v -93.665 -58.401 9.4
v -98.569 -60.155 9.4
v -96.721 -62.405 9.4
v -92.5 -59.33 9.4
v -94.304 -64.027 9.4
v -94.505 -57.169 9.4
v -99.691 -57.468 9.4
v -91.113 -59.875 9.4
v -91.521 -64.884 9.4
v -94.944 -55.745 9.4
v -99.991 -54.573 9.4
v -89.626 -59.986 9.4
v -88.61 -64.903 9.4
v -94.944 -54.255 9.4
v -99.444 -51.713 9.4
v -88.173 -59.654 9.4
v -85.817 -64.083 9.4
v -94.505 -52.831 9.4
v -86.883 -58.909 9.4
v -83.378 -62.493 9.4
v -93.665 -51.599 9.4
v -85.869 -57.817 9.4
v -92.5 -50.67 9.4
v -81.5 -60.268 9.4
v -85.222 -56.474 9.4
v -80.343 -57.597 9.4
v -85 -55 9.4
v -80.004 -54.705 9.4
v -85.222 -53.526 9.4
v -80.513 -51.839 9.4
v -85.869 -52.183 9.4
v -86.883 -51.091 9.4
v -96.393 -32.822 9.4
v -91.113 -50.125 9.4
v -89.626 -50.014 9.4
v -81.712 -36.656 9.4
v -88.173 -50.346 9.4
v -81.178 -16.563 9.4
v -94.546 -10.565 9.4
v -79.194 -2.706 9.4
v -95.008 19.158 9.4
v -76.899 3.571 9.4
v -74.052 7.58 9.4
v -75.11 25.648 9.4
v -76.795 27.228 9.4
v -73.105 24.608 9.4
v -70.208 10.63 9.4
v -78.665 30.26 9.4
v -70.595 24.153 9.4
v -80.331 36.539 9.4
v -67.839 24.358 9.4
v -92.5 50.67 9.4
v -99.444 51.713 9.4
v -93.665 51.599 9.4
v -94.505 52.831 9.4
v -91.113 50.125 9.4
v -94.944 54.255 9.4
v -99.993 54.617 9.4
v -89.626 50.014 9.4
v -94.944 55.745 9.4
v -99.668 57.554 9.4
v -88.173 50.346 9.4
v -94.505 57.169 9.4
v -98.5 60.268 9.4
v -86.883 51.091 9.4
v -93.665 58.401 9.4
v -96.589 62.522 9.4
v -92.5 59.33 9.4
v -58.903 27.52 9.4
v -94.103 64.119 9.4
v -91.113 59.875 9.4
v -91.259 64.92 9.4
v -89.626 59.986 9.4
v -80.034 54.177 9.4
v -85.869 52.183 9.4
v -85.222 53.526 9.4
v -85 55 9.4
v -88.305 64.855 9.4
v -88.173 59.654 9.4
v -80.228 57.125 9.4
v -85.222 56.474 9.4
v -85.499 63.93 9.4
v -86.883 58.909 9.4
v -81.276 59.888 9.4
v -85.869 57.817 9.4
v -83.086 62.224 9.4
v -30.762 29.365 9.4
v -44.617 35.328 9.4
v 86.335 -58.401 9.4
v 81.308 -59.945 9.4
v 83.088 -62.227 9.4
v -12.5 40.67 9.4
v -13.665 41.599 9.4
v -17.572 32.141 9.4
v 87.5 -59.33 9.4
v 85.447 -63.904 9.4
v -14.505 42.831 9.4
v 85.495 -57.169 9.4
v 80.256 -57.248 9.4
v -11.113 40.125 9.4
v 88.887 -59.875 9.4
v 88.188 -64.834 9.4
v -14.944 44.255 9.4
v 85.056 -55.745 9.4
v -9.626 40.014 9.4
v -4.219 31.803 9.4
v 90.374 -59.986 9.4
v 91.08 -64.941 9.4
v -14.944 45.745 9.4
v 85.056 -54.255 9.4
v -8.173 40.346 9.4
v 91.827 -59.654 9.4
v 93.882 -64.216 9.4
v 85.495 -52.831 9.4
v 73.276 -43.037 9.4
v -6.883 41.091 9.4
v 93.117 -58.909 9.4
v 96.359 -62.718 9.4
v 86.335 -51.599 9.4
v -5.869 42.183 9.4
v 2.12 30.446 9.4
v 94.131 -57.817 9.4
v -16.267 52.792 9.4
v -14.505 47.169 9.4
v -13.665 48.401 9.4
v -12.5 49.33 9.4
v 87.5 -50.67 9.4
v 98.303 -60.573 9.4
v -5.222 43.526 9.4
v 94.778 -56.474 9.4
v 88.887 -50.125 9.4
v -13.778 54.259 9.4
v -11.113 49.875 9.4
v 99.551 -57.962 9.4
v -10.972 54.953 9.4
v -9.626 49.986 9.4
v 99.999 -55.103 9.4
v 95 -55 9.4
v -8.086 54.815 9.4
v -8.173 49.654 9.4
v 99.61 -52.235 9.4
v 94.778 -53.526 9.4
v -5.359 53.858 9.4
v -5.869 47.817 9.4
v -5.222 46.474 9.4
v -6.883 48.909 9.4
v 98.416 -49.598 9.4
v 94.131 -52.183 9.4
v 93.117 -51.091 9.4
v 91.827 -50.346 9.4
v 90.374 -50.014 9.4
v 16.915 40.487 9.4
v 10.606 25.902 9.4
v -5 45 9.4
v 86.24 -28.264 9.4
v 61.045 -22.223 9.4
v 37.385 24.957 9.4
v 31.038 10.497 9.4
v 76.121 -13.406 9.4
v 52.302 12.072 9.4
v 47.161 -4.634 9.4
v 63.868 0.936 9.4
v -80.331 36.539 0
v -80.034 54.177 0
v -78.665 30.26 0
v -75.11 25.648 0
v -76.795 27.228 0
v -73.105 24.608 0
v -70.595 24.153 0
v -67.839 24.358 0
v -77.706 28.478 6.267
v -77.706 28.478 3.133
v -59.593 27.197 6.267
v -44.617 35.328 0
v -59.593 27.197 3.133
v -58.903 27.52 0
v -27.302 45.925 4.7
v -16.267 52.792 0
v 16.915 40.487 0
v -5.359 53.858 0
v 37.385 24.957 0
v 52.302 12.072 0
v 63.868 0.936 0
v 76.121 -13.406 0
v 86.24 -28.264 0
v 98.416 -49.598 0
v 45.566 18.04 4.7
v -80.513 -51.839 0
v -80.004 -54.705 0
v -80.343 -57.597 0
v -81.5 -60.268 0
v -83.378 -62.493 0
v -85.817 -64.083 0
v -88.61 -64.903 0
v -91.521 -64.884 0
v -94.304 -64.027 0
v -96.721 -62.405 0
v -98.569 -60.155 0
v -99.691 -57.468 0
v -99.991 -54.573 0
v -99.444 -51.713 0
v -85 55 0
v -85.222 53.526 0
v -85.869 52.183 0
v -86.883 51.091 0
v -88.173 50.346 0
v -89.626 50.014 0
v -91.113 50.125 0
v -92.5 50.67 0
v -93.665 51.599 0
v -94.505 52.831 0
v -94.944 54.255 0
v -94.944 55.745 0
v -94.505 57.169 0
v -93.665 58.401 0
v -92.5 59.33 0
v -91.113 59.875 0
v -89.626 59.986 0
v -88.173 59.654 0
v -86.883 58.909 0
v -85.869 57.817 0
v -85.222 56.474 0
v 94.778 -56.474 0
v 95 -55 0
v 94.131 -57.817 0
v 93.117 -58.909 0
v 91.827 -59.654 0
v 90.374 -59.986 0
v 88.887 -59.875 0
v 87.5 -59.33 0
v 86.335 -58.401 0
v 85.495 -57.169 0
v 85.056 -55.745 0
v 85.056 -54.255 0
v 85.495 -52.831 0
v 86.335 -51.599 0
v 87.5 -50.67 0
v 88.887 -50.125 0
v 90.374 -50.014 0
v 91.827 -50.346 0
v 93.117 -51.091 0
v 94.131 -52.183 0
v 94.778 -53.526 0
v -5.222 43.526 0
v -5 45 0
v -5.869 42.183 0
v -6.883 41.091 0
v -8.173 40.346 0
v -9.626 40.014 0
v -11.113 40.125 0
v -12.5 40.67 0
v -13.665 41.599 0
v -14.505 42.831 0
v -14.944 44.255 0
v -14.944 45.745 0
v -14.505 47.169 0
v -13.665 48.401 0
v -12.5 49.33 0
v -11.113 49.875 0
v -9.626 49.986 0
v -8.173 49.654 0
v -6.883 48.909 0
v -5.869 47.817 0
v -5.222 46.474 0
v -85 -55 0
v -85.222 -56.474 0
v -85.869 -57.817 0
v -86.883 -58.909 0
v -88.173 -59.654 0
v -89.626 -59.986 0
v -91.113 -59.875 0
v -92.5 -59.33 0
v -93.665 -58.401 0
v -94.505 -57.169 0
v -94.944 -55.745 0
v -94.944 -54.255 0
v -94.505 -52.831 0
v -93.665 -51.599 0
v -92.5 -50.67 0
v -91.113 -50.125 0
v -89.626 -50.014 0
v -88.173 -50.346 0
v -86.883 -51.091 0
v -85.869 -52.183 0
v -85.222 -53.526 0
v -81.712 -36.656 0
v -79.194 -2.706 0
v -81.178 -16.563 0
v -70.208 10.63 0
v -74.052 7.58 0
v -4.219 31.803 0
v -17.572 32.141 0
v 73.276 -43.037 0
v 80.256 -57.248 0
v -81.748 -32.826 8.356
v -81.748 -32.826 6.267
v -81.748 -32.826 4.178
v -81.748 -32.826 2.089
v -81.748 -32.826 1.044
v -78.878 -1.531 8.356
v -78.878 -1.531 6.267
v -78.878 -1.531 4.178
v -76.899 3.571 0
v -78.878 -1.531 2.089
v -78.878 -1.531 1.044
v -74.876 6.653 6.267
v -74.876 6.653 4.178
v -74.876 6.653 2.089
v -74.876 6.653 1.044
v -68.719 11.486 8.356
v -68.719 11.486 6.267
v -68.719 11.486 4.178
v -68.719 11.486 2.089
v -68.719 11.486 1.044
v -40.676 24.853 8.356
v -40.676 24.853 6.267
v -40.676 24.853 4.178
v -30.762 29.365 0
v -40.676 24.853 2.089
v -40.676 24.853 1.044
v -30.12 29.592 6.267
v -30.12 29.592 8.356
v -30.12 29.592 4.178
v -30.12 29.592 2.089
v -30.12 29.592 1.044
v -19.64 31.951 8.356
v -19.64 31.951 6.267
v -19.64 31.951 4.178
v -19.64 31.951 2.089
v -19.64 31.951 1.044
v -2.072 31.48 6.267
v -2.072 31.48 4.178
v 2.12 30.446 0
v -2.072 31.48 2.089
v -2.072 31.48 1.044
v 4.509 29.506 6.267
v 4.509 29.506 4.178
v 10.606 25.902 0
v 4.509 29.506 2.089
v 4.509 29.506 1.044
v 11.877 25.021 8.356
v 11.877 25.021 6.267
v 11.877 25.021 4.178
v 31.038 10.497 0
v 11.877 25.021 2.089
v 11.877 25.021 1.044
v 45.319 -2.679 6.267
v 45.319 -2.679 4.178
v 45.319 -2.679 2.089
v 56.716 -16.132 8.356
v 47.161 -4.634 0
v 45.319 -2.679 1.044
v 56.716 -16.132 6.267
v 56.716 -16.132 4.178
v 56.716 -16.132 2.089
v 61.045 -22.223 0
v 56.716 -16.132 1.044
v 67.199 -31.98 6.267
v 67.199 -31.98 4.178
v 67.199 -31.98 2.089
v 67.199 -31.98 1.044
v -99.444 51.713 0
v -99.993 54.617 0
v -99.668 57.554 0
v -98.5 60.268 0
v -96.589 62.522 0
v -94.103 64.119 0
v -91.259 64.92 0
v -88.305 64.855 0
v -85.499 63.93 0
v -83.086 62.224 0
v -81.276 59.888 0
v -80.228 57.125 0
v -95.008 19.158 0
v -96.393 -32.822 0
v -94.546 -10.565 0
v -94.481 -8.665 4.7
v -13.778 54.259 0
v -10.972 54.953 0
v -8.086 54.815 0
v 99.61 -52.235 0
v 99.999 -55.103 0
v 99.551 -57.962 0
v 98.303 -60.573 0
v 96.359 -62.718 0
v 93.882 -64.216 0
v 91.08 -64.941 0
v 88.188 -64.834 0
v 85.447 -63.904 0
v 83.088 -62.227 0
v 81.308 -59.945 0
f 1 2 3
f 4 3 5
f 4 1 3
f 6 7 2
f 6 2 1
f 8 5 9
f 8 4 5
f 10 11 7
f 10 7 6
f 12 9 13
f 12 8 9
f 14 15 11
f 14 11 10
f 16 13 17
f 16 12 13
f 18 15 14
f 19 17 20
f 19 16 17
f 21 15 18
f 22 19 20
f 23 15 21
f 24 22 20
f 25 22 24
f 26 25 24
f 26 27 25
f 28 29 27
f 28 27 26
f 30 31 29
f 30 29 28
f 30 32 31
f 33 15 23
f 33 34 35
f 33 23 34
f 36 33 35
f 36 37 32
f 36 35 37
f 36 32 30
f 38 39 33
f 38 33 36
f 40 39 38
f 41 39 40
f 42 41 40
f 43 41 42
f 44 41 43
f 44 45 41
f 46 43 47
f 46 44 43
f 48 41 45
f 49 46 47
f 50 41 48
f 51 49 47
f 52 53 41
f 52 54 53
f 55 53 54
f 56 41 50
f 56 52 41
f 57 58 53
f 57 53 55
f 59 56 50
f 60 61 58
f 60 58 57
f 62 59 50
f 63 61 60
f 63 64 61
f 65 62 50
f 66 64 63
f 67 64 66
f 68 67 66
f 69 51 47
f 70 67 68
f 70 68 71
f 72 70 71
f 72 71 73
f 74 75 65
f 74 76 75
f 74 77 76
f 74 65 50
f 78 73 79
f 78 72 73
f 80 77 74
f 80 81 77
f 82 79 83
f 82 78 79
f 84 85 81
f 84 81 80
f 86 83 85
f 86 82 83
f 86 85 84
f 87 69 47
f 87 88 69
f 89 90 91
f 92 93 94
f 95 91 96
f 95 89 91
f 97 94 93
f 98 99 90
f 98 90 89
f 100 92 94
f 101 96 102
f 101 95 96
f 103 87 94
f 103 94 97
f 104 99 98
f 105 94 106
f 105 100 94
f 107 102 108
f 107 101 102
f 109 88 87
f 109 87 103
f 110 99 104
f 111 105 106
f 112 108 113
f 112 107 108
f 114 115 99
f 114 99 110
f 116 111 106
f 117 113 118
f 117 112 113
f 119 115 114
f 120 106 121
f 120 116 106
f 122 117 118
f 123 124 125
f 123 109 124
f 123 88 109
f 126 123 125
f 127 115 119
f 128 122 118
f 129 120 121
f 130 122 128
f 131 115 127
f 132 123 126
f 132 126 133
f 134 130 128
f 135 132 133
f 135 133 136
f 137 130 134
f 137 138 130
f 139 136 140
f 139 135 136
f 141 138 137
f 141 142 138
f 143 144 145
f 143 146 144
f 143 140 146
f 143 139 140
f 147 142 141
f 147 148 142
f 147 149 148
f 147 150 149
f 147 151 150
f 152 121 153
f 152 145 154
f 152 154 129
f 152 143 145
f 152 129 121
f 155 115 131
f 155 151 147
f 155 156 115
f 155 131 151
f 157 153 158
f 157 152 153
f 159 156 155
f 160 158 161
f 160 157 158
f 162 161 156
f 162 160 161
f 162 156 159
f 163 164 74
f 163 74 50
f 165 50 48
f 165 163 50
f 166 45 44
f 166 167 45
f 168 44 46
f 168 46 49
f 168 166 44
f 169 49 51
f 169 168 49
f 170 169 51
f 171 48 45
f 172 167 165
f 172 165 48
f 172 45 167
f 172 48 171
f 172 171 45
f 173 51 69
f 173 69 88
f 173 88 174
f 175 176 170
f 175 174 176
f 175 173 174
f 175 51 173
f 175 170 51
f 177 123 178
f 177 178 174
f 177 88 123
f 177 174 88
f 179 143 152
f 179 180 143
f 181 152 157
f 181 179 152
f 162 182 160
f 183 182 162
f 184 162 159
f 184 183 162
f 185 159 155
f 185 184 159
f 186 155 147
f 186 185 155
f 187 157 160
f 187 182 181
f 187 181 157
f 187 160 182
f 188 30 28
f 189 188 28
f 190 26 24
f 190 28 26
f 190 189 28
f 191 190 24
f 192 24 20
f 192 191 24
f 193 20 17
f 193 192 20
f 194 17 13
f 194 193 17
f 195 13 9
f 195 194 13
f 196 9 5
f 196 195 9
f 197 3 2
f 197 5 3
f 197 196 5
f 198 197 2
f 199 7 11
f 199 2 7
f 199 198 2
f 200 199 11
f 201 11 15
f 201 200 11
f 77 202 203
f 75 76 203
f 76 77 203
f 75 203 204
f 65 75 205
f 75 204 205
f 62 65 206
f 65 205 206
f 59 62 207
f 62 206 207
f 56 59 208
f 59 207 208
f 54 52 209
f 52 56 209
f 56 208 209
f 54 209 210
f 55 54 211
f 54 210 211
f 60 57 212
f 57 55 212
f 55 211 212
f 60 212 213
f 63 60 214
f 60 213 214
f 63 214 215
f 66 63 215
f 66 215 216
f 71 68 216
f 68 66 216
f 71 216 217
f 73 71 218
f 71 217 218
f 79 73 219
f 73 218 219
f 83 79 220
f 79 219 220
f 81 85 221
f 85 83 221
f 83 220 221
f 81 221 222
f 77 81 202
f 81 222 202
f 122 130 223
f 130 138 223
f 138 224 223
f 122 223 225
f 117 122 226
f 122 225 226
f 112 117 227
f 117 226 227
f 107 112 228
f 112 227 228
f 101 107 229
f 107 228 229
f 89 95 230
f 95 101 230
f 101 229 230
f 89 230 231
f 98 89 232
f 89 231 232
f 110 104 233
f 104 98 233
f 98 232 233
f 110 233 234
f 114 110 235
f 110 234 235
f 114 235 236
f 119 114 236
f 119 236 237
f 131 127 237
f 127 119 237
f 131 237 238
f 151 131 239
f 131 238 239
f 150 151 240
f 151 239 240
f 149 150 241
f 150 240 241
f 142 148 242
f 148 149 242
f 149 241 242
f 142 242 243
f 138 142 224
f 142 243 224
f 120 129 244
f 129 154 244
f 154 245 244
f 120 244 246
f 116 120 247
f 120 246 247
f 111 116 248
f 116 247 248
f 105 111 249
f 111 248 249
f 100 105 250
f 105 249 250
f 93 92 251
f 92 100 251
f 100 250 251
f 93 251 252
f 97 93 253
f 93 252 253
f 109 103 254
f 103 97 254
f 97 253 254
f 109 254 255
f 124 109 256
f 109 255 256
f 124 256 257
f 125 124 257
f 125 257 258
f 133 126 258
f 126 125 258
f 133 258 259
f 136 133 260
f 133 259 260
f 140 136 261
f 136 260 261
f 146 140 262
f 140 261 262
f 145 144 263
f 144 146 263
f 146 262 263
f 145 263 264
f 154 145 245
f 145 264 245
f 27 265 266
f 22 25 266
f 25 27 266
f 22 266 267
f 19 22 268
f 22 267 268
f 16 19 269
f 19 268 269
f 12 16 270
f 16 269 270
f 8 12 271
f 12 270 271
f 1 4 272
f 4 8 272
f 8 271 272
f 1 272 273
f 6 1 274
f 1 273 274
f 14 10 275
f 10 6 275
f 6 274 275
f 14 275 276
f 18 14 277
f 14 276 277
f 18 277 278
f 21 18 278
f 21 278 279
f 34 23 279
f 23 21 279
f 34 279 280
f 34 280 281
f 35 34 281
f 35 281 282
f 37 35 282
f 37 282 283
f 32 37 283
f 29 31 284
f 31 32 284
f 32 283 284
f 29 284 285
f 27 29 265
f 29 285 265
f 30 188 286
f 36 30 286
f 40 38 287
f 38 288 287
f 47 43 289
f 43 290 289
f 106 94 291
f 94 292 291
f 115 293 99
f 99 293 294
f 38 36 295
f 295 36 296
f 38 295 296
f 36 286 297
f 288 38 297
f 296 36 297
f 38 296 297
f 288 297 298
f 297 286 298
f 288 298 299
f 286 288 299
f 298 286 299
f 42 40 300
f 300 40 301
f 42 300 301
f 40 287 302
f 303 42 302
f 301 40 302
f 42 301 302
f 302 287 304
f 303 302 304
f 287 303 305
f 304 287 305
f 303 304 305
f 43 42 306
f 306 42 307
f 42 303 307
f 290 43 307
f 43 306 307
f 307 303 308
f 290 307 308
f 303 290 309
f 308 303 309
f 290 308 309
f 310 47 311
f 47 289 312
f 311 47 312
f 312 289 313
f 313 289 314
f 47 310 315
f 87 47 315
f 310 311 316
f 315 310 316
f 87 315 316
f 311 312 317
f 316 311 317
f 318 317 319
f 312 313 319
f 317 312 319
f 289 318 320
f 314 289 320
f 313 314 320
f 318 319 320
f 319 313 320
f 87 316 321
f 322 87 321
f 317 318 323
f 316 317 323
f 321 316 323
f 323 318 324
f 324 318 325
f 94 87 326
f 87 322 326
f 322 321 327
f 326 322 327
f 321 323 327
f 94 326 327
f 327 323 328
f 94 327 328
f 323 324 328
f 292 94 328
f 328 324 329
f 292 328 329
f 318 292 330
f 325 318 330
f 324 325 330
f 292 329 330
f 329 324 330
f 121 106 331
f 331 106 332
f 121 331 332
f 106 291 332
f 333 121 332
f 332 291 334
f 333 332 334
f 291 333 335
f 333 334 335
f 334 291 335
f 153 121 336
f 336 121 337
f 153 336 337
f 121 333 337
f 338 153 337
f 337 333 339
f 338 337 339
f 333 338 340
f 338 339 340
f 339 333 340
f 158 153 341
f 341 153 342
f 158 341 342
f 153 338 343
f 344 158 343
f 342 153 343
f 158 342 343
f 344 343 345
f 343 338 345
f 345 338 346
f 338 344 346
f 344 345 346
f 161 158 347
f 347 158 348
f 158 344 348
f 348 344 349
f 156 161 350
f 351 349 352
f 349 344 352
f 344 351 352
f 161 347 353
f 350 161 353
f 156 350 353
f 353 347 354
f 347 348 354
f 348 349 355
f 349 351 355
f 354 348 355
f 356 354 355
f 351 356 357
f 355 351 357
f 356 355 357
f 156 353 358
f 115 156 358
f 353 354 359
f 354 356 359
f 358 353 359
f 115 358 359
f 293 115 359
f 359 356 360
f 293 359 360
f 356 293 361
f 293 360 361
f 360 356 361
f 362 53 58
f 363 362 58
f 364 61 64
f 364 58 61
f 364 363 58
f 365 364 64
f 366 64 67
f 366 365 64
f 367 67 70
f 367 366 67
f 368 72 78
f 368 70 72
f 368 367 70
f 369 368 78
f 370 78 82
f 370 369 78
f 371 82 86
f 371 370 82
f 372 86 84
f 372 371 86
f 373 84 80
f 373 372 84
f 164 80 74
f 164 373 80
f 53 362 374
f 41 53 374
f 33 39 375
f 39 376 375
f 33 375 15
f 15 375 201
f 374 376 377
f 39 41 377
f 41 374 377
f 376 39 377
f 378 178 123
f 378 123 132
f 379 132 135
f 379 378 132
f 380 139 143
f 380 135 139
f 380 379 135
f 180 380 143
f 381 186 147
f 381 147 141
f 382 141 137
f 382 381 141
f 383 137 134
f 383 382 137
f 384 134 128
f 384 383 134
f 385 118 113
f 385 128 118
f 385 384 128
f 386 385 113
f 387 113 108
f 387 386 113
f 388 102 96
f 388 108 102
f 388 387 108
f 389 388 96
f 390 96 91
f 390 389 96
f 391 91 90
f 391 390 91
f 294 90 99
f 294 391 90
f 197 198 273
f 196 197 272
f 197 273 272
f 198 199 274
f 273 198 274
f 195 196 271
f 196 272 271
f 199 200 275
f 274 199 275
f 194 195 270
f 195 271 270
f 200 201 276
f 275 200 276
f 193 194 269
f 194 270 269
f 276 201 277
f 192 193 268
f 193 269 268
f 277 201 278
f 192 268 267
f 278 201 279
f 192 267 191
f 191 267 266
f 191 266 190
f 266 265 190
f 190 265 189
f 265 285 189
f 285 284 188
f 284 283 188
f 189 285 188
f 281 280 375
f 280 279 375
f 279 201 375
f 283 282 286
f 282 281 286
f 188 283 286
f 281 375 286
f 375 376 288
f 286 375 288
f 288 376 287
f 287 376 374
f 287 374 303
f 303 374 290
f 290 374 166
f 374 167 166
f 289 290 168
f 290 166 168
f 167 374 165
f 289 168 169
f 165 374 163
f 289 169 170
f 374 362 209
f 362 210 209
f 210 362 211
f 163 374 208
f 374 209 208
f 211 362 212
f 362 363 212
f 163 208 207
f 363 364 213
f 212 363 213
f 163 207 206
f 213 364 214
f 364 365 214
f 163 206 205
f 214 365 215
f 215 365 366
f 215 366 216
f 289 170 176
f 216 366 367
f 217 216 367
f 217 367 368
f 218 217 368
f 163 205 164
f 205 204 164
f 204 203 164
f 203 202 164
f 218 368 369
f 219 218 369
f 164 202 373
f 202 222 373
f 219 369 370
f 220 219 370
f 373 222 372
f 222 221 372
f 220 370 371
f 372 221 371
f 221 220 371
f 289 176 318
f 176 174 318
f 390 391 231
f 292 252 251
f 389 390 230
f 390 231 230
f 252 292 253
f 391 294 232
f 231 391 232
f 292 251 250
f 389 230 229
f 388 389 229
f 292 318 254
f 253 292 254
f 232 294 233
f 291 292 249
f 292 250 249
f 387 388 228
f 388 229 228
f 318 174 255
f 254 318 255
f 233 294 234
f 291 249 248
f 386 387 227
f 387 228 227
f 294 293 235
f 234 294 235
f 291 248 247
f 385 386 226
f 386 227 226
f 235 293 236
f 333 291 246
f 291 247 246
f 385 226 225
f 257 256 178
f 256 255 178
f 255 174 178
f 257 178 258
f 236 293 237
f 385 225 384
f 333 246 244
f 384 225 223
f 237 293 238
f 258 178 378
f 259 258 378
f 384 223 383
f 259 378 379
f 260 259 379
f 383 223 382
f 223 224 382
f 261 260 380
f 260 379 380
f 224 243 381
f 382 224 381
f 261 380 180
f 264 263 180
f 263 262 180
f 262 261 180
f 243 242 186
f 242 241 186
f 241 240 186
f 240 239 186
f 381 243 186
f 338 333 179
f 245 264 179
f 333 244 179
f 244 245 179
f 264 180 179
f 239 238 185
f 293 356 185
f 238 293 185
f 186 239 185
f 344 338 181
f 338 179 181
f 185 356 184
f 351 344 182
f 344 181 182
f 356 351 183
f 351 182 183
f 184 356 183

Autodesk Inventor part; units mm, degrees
ref_plane "YZ Plane" through (0, 0, 0) normal (1, 0, 0) x (0, 1, 0)
ref_plane "XZ Plane" through (0, 0, 0) normal (0, 1, 0) x (-1, 0, 0)
ref_plane "XY Plane" through (0, 0, 0) normal (0, 0, 1) x (1, 0, 0)
sketch "Sketch1" plane through (0, 0, 0) normal (0, 0, 1) x (1, 0, 0)
  line L0 (-110, 70) -> (110, 70) construction
  line L1 (110, 70) -> (110, -70) construction
  line L2 (110, -70) -> (-110, -70) construction
  line L3 (-110, -70) -> (-110, 70) construction
  circle A0 centre (-90, 55) radius 5
  circle A1 centre (-90, -55) radius 5
  circle A2 centre (90, -55) radius 5
  circle A3 centre (-10, 45) radius 5
  line L4 (-67, 0) -> (-42, 0) construction
  line L5 (-42, 0) -> (-42, -30) construction
  line L6 (-42, -30) -> (-67, -30) construction
  line L7 (-67, -30) -> (-67, 0) construction
  circle A4 centre (-54.5, -11) radius 10 construction
  circle A5 centre (-63.5044, -24.4163) radius 3 construction
  circle A6 centre (-57.3559, -26.4695) radius 3 construction
  circle A7 centre (-51.263, -24.6531) radius 3 construction
  circle A8 centre (-45.3418, -26.5938) radius 3 construction
  arc A9 (-80.0339, 54.177) -> (-99.4444, 51.7131) centre (-90, 55) ccw
  arc A10 (80.256, -57.2483) -> (98.4155, -49.5982) centre (90, -55) ccw
  arc A11 (-99.4444, -51.7131) -> (-80.5128, -51.8388) centre (-90, -55) ccw
  arc A12 (-5.3594, 53.858) -> (-16.2673, 52.7923) centre (-10, 45) ccw
  line L8 (-99.4444, 51.7131) -> (-95, 27.4878) construction
  line L9 (-95, 27.4878) -> (-93.8149, 3.2662) construction
  line L10 (-93.8149, 3.2662) -> (-93.8149, -21) construction
  line L11 (-93.8149, -21) -> (-97.9589, -43.6087) construction
  line L12 (-97.9589, -43.6087) -> (-99.4444, -51.7131) construction
  spline S0 degree 4 poles (-99.4444, 51.7131) (-95, 27.4878) (-93.8149, 3.2662) (-93.8149, -21) (-97.9589, -43.6087) (-99.4444, -51.7131) knots 1 1 1 1 1 2 3 3 3 3 3
  line L13 (-80.0339, 54.177) -> (-80.9917, 42.5781) construction
  line L14 (-80.9917, 42.5781) -> (-80.9917, 31.0335) construction
  line L15 (-80.9917, 31.0335) -> (-74.3239, 18.9012) construction
  line L16 (-74.3239, 18.9012) -> (-58.5299, 25.7807) construction
  line L17 (-58.5299, 25.7807) -> (-18.4474, 51.5962) construction
  line L18 (-18.4474, 51.5962) -> (-16.2673, 52.7923) construction
  spline S1 degree 4 poles (-80.0339, 54.177) (-80.9917, 42.5781) (-80.9917, 31.0335) (-74.3239, 18.9012) (-58.5299, 25.7807) (-18.4474, 51.5962) (-16.2673, 52.7923) knots 1 1 1 1 1 2 3 4 4 4 4 4
  line L19 (-80.5128, -51.8388) -> (-81.9566, -43.6087) construction
  line L20 (-81.9566, -43.6087) -> (-81.9566, -21) construction
  line L21 (-81.9566, -21) -> (-80.5128, 3.2662) construction
  line L22 (-80.5128, 3.2662) -> (-70.6976, 12.3031) construction
  line L23 (-70.6976, 12.3031) -> (-51.263, 17.488) construction
  line L24 (-51.263, 17.488) -> (-30.2965, 32.65) construction
  line L25 (-30.2965, 32.65) -> (-8.3751, 32.65) construction
  line L26 (-8.3751, 32.65) -> (5.2827, 31.0335) construction
  line L27 (5.2827, 31.0335) -> (14.5834, 22.3409) construction
  line L28 (14.5834, 22.3409) -> (59.8169, -8.8669) construction
  line L29 (59.8169, -8.8669) -> (77.6071, -52.4205) construction
  line L30 (77.6071, -52.4205) -> (80.256, -57.2483) construction
  spline S2 degree 4 poles (-80.5128, -51.8388) (-81.9566, -43.6087) (-81.9566, -21) (-80.5128, 3.2662) (-70.6976, 12.3031) (-51.263, 17.488) (-30.2965, 32.65) (-8.3751, 32.65) (5.2827, 31.0335) (14.5834, 22.3409) (59.8169, -8.8669) (77.6071, -52.4205) (80.256, -57.2483) knots 1 1 1 1 1 2 3 4 5 6 7 8 9 10 10 10 10 10
  line L31 (-5.3594, 53.858) -> (9.6288, 46.0058) construction
  line L32 (9.6288, 46.0058) -> (31.8174, 31.0335) construction
  line L33 (31.8174, 31.0335) -> (59.8169, 6.737) construction
  line L34 (59.8169, 6.737) -> (80, -15) construction
  line L35 (80, -15) -> (98.4155, -49.5982) construction
  spline S3 degree 4 poles (-5.3594, 53.858) (9.6288, 46.0058) (31.8174, 31.0335) (59.8169, 6.737) (80, -15) (98.4155, -49.5982) knots 1 1 1 1 1 2 3 3 3 3 3
  point P0 (0, 0)
  dimension "d1" = 70
  dimension "d2" = 70
  dimension "d3" = 110
  dimension "d4" = 110
  dimension "d5" = 10
  dimension "d6" = 10
  dimension "d7" = 10
  dimension "d8" = 10
  dimension "d9" = 55
  dimension "d10" = 55
  dimension "d11" = 55
  dimension "d12" = 180
  dimension "d13" = 90
  dimension "d14" = 90
  dimension "d16" = 45
  dimension "d17" = 42
  dimension "d18" = 30
  dimension "d19" = 0
  dimension "d20" = 25
  dimension "d21" = 20
  dimension "d22" = 6
  dimension "d23" = 6
  dimension "d24" = 6
  dimension "d25" = 11
  dimension "d26" = 12.5
  dimension "d27" = 6
  dimension "d41" = 20
  dimension "d43" = 20
  dimension "d44" = 20
  dimension "d45" = 20
  dimension "d46" = 10
extrude "Extrusion3" add sketch "Sketch1" along normal blind 9.4
equation "\"d1\" = d2"
equation "\"d4\" = d3"
equation "\"d10\" = d9"
equation "\"d11\" = d9"
equation "\"d14\" = d13"
equation "\"d26\" = 0.5 * d20"
properties part number "Bracket Concept MK3"
